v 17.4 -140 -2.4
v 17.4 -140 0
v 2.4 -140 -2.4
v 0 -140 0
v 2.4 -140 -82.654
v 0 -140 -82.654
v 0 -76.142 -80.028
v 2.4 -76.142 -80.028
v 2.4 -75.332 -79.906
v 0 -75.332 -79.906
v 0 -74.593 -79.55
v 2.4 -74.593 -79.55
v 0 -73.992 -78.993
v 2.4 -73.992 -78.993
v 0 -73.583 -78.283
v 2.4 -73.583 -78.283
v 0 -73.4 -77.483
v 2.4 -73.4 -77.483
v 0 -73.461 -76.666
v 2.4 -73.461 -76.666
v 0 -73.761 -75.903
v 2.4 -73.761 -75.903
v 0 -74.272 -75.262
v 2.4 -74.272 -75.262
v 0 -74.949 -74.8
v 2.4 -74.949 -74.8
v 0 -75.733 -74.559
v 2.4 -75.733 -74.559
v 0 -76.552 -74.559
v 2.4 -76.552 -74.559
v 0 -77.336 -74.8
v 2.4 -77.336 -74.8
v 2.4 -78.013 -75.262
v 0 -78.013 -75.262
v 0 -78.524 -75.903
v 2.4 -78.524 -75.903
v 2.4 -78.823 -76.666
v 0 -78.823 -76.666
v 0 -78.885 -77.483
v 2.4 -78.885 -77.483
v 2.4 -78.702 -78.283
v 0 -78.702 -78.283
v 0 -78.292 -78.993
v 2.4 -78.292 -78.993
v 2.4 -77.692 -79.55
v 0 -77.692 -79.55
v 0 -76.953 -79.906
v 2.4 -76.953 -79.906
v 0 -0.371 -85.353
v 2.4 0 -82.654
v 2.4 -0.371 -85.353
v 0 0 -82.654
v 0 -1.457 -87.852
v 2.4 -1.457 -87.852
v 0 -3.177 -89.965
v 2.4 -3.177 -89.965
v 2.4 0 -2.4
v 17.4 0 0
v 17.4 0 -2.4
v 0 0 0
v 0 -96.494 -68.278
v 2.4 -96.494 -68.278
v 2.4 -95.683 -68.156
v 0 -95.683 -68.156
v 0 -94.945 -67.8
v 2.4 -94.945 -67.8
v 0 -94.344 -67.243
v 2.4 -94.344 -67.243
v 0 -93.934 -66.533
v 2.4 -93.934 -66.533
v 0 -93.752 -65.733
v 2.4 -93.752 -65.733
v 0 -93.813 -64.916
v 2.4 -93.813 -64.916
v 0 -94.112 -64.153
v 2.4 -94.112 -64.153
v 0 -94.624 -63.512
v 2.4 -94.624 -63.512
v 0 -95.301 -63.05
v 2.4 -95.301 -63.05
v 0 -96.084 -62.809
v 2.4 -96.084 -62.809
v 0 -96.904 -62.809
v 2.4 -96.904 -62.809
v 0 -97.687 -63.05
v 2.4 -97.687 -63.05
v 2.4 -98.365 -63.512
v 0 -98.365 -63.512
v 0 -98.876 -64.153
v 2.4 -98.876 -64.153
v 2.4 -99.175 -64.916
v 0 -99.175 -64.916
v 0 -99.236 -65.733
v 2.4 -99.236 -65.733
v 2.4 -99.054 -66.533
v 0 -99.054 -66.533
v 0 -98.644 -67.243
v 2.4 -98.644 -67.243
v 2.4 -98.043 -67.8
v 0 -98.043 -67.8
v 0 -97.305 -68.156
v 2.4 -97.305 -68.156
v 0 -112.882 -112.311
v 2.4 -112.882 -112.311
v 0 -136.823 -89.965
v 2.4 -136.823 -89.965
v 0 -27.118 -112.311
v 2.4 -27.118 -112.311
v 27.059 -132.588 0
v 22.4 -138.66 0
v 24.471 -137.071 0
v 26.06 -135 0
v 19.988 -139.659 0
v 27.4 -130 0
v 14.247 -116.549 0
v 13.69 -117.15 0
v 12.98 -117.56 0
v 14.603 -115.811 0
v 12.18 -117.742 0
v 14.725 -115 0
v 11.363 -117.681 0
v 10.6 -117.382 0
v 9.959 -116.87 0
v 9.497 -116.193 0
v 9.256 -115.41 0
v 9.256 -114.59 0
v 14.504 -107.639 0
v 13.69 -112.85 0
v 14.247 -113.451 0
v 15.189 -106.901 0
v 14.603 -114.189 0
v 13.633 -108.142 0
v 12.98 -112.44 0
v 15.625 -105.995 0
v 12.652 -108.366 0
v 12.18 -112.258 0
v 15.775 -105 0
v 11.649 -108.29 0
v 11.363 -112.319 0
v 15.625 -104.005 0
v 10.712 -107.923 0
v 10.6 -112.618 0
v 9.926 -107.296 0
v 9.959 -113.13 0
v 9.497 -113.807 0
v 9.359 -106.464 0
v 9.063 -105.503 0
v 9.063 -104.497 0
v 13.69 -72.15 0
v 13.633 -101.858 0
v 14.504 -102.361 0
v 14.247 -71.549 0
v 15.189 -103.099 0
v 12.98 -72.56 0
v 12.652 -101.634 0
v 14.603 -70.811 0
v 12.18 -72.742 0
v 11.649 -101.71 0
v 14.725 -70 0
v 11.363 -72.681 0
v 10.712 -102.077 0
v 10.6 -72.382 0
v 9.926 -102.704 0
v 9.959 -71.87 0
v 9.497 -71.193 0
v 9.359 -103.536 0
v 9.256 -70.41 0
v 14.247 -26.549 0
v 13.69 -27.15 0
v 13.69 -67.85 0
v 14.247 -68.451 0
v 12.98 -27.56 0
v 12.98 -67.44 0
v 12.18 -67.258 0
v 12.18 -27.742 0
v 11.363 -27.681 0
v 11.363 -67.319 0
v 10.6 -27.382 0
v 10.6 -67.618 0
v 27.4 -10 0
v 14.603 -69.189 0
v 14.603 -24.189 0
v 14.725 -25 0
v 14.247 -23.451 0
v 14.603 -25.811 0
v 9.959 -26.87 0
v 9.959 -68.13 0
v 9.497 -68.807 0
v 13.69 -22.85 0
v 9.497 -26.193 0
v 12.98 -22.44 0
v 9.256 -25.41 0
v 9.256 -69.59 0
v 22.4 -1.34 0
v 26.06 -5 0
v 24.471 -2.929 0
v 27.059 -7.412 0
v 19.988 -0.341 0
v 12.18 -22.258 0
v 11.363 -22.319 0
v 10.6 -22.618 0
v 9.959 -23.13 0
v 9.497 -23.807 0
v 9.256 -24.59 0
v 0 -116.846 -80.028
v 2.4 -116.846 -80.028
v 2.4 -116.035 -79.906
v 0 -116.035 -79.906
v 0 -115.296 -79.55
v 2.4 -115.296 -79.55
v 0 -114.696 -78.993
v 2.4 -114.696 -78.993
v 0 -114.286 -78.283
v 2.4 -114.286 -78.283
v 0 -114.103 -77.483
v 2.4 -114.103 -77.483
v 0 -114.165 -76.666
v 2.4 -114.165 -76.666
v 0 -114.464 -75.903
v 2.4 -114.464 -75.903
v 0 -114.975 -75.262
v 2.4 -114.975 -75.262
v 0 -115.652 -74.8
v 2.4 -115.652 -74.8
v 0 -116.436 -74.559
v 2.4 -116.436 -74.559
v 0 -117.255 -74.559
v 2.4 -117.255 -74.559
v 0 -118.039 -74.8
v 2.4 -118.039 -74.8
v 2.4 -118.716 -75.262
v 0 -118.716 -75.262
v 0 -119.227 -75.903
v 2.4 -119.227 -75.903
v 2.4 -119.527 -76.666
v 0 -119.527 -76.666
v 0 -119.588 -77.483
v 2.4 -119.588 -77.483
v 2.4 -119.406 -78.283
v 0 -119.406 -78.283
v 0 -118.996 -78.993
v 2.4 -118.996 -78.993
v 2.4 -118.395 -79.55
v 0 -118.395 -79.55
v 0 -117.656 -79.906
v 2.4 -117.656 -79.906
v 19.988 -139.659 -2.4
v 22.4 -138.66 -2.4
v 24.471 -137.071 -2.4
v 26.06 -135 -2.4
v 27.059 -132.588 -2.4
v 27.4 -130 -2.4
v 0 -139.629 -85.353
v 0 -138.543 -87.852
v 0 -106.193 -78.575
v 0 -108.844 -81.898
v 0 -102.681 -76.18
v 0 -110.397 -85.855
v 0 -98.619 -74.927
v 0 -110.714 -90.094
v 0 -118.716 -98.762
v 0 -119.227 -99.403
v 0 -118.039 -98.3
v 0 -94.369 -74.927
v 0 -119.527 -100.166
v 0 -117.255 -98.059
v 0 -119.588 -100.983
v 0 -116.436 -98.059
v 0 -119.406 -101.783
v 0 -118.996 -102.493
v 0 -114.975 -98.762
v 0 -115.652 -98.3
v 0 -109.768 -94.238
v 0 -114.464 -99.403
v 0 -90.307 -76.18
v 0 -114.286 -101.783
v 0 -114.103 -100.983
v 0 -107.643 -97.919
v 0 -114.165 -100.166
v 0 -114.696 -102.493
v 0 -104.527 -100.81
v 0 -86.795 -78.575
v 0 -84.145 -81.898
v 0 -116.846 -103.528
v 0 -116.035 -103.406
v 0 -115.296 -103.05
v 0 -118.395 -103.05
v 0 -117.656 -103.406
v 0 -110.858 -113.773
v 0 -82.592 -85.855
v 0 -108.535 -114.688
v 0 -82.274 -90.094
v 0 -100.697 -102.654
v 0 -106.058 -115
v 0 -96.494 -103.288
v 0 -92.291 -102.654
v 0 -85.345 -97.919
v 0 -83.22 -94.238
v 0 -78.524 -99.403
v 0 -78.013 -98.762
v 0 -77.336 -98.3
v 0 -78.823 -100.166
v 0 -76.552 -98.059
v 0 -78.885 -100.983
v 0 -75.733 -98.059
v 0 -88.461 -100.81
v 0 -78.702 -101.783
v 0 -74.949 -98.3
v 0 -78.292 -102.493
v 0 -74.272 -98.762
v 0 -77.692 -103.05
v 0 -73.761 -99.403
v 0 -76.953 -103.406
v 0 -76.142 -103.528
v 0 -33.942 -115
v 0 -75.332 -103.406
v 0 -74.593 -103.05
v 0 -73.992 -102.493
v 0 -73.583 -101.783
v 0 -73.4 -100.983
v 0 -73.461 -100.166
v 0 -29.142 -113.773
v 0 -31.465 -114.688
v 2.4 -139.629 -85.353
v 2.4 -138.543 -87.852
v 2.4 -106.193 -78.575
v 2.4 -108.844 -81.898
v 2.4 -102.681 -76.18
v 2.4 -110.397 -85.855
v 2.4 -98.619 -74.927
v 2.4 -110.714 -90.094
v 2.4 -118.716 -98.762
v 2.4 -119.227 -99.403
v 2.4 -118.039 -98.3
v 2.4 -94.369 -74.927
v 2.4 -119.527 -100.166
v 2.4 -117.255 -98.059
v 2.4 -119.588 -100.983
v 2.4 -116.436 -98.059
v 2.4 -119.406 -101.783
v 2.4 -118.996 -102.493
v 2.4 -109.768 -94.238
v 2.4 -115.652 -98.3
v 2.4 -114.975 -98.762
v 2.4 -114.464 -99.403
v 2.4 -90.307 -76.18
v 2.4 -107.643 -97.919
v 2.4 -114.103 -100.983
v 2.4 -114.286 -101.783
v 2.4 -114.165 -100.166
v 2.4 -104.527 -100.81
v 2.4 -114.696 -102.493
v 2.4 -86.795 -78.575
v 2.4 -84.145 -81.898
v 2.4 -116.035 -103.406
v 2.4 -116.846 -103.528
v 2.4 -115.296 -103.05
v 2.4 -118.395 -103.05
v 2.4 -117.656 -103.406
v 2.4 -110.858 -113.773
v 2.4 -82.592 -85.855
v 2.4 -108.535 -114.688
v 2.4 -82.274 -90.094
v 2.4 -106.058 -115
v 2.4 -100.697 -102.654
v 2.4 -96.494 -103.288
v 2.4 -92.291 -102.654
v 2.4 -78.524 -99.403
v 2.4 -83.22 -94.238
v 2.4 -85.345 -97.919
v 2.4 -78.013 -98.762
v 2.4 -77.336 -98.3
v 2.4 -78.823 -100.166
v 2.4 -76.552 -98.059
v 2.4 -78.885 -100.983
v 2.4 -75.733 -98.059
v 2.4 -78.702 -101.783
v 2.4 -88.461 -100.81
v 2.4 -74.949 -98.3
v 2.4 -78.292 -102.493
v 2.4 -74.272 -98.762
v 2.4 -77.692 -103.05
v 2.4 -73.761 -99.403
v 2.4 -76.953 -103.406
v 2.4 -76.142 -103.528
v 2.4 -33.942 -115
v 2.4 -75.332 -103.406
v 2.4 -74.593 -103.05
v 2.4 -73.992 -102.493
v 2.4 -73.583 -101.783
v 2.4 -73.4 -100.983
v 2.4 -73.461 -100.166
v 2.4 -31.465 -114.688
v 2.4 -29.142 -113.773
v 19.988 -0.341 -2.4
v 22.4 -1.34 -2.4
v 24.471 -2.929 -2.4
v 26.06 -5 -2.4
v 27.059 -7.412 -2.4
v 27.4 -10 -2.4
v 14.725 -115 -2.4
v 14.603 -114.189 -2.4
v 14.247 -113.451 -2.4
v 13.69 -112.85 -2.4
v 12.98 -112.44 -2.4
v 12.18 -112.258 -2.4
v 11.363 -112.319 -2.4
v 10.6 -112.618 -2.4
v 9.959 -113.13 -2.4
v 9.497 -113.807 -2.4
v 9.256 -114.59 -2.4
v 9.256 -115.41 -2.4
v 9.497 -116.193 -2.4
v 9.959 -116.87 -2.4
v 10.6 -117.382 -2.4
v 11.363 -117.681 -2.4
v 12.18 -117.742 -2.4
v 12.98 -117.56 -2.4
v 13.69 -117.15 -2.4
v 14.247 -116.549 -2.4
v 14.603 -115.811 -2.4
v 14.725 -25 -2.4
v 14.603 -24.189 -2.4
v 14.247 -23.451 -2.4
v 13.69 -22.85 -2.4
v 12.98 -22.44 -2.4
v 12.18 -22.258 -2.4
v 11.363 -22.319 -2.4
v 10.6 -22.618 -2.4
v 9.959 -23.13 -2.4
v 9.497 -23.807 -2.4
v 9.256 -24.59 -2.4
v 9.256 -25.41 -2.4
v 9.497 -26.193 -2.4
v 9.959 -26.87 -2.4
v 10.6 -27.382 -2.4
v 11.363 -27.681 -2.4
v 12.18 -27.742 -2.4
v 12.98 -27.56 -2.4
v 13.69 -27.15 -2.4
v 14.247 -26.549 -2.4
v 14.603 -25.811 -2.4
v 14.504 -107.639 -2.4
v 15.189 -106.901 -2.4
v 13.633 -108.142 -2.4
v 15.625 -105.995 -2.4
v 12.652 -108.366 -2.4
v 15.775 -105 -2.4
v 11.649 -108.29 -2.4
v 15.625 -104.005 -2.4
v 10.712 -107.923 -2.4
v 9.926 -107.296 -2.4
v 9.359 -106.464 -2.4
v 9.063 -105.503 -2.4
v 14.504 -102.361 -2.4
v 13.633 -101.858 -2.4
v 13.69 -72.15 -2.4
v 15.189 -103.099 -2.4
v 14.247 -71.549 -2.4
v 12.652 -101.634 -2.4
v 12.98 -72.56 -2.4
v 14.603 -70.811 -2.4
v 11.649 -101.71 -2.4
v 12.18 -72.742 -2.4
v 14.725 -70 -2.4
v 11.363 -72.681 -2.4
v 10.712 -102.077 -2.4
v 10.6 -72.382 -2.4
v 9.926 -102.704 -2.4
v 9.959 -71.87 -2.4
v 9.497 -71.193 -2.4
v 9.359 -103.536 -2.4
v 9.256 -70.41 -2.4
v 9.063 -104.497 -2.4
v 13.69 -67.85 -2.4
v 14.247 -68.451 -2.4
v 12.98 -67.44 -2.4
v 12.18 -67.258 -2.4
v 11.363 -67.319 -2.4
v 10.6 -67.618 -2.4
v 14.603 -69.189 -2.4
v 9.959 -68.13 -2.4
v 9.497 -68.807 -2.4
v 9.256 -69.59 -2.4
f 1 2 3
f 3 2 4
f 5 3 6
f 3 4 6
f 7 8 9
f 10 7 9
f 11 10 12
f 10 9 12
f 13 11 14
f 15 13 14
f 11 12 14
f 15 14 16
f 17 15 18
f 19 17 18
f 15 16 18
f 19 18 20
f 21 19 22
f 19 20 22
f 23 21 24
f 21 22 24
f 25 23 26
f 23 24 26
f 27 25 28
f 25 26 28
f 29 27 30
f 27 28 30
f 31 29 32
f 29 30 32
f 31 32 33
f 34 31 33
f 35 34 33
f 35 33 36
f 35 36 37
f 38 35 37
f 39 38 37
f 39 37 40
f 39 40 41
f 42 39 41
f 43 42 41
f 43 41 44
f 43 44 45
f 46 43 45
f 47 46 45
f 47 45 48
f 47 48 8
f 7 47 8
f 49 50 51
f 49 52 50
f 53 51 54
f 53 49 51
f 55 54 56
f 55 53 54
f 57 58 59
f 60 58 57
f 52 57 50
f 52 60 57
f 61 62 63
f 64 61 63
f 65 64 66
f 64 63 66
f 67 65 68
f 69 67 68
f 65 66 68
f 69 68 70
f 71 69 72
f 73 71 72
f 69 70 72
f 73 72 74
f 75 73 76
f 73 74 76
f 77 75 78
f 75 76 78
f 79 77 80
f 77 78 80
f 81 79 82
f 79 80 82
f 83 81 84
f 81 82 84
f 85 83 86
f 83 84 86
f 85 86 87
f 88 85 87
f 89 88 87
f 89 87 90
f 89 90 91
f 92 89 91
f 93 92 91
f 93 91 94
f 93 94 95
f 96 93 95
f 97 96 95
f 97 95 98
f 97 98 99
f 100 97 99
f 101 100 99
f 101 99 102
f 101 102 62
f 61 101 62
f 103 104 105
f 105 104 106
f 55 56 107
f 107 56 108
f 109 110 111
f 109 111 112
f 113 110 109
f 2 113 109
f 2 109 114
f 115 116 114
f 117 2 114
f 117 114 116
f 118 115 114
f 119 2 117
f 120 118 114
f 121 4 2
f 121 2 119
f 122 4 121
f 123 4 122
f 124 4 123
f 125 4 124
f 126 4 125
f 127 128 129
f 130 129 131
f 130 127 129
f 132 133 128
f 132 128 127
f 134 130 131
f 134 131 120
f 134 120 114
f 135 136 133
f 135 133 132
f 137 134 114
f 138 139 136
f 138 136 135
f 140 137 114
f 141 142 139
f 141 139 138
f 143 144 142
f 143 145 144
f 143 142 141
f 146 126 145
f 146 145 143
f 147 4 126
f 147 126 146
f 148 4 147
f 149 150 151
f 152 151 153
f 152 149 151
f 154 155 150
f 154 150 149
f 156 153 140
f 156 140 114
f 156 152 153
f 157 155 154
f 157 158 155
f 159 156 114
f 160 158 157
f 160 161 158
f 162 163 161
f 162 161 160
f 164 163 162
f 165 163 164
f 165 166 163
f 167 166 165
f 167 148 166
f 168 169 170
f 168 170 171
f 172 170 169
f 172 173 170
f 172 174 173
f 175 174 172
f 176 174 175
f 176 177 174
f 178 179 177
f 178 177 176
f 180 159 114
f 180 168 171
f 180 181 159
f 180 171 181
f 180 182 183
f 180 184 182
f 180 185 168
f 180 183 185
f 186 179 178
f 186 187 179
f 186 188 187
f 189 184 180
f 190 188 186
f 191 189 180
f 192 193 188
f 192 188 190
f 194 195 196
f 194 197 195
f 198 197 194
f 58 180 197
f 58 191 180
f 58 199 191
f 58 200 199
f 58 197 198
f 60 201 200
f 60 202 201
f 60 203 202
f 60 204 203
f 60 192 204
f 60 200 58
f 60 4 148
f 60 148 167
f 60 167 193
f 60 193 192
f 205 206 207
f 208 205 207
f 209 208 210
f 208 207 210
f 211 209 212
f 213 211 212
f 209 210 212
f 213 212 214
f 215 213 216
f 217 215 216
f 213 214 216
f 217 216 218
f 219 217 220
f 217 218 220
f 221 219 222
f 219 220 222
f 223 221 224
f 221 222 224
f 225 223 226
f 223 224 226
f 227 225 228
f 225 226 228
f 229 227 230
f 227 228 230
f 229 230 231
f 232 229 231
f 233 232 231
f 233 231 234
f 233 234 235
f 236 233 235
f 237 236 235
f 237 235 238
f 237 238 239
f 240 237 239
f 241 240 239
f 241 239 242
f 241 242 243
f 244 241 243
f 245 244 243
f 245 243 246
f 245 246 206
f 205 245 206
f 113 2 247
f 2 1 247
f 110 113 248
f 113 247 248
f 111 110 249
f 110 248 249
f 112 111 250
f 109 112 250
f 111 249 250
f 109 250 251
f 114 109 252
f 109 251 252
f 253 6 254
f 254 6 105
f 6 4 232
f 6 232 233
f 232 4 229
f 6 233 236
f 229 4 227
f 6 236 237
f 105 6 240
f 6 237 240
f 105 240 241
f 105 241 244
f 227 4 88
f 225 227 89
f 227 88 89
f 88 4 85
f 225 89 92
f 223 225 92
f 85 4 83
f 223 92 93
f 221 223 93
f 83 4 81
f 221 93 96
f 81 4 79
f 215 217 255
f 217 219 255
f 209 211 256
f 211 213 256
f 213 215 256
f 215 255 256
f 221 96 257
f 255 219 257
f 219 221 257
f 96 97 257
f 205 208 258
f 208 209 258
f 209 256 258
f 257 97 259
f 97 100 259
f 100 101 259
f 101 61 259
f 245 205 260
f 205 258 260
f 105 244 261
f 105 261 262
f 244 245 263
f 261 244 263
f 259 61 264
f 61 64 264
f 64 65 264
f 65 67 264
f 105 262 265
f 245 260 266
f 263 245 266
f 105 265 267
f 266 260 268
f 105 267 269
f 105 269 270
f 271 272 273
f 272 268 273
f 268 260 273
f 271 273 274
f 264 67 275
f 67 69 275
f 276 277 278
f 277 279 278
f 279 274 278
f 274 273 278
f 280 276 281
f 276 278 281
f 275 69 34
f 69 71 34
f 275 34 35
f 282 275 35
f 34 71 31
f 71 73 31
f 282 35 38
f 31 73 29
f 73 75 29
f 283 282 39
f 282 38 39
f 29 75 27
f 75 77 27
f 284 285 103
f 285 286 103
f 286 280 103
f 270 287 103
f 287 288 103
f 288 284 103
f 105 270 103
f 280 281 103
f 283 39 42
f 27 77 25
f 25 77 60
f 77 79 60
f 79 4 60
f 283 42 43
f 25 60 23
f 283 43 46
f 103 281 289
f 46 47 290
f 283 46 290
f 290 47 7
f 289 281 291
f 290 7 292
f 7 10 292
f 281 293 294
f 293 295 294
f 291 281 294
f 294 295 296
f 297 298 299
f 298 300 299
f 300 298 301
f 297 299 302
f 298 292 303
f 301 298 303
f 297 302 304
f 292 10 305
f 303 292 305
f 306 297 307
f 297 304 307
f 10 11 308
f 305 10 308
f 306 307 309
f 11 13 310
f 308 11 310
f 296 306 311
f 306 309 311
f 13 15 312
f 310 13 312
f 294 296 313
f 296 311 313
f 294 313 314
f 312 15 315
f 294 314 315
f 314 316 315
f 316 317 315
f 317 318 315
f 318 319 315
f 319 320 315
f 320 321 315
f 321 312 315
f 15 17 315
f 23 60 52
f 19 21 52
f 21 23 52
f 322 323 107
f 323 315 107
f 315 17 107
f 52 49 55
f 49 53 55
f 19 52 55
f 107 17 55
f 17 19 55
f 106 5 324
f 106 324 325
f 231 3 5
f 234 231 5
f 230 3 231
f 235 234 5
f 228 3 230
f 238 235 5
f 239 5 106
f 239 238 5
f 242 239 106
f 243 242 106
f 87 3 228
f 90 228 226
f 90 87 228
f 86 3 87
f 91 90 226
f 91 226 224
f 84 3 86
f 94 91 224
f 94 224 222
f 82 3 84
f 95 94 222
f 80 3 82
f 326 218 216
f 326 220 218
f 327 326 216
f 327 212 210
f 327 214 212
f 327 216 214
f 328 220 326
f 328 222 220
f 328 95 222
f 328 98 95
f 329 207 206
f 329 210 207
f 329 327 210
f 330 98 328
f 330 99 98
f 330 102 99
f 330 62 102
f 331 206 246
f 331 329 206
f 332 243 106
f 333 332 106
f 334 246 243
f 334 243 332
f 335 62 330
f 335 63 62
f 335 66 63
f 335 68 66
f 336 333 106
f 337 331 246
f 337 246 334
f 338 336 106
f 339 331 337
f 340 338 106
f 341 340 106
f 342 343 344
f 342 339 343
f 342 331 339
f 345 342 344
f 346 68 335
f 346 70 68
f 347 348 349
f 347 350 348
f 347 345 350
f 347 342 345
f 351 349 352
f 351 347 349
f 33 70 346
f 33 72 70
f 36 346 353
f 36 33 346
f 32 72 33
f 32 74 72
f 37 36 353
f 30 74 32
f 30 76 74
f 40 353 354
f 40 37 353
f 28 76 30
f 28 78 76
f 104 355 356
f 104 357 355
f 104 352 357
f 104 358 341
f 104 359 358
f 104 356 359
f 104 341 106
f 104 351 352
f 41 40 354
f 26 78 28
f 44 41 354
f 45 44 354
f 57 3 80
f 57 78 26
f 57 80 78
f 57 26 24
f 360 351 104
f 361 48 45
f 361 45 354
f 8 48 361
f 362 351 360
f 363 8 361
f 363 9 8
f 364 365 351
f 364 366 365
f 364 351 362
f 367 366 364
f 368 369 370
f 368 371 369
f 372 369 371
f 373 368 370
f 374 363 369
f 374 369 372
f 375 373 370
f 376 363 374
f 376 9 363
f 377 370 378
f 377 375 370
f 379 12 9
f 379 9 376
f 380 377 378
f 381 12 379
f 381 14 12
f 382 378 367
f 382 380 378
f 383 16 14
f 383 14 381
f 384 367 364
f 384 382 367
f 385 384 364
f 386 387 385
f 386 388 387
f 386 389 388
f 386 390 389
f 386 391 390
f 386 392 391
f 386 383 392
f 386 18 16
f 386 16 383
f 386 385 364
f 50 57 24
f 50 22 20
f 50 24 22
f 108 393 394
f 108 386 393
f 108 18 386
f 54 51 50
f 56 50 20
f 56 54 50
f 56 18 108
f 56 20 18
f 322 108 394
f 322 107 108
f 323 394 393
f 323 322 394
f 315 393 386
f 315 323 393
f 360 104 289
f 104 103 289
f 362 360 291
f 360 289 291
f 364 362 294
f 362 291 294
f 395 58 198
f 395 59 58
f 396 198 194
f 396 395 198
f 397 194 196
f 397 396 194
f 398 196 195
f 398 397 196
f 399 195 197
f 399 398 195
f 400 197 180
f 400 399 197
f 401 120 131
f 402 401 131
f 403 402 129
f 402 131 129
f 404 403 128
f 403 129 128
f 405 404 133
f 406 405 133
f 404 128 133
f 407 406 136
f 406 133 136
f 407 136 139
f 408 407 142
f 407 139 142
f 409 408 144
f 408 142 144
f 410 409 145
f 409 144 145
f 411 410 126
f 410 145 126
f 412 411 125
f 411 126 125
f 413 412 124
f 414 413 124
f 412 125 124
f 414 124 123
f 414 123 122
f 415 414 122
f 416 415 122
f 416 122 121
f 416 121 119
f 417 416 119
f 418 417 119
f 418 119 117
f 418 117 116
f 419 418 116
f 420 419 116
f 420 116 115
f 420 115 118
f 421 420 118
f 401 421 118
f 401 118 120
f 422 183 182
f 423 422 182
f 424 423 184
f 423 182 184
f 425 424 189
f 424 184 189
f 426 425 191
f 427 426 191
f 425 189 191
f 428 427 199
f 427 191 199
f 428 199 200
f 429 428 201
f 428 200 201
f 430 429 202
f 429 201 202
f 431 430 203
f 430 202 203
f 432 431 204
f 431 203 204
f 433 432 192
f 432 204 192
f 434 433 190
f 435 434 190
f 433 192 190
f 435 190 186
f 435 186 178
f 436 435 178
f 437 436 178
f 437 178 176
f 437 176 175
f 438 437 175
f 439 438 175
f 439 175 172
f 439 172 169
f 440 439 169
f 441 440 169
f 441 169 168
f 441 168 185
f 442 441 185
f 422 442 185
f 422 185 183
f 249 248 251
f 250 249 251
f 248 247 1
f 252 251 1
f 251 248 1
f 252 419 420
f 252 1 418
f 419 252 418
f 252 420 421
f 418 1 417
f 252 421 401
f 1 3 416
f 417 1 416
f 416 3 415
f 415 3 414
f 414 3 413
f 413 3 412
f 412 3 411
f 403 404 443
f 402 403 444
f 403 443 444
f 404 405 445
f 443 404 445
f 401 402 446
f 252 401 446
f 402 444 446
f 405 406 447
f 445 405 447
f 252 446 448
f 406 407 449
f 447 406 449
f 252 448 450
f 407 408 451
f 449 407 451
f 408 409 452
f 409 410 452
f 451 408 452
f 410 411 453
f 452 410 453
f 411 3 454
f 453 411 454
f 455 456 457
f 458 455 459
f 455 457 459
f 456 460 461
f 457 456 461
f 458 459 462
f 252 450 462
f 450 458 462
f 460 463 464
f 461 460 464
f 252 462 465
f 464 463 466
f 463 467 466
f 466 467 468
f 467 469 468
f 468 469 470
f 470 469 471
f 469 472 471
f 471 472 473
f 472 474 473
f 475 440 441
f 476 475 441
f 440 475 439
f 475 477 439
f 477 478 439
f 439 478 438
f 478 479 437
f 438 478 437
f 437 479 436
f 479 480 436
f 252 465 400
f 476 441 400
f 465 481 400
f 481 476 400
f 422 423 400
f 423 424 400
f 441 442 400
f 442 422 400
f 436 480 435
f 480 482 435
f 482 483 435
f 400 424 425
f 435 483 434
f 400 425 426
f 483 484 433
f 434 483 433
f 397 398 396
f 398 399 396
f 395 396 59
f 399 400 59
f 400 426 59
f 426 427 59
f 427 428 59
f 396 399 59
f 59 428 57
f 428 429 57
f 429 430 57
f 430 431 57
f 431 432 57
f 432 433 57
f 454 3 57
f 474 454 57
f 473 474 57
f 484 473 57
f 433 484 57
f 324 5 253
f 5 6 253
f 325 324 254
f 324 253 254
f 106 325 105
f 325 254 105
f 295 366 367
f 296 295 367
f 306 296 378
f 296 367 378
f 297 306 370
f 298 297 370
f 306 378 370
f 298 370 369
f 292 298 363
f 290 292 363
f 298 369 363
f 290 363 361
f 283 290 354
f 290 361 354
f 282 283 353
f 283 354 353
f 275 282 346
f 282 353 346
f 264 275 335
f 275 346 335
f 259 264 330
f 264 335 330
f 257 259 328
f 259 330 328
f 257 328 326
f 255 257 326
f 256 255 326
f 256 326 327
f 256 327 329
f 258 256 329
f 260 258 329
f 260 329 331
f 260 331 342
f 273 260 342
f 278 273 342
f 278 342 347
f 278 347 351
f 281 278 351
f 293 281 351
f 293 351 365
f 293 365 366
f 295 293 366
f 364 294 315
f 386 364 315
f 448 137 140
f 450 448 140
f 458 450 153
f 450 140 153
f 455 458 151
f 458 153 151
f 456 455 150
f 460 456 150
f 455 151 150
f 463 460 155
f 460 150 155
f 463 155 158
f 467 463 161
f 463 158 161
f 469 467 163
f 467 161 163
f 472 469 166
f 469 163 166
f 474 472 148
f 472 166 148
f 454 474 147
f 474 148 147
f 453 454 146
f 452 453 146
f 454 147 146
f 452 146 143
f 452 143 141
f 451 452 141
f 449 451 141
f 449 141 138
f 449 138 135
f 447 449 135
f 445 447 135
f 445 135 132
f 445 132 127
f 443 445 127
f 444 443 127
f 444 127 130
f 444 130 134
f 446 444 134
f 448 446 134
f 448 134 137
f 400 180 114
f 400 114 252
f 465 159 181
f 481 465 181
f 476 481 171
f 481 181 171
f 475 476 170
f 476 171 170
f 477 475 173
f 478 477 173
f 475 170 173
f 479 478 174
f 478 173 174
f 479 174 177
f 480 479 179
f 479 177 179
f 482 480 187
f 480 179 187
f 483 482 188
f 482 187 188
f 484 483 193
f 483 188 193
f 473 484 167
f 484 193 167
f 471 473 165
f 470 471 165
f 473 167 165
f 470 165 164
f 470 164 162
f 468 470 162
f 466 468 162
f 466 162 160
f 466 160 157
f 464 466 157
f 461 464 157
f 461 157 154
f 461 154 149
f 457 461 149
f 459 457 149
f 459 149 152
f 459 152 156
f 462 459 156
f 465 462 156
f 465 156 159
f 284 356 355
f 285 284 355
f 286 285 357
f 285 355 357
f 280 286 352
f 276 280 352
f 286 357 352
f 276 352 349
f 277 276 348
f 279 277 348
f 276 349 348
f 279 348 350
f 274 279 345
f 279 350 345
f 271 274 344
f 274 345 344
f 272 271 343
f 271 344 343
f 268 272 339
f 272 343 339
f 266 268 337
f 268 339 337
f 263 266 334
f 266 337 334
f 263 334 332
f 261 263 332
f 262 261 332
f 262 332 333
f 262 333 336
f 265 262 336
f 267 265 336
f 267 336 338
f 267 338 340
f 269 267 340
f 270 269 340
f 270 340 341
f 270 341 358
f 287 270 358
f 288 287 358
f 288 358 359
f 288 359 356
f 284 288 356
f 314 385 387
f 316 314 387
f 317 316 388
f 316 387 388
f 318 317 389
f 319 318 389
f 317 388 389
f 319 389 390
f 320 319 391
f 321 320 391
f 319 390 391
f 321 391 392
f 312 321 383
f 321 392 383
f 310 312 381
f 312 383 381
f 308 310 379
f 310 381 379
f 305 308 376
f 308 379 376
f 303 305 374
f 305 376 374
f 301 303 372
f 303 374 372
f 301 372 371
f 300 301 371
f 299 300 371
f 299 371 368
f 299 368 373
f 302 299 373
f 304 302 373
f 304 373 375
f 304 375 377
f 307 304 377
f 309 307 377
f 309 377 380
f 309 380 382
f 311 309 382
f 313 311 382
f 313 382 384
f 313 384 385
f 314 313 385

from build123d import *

# Parameters (mm, degrees)
SKETCH1_W           = 115
SKETCH1_H           = 140
BOSS_EXTRUDE1_DEPTH = 2.4
CUT_EXTRUDE1_DEPTH  = 3.4
FILLET1_R           = 10
SKETCH3_W           = 2.4
SKETCH3_H           = 140
BOSS_EXTRUDE2_DEPTH = 25
FILLET2_R           = 10
SKETCH4_R           = 2.75
CUT_EXTRUDE2_DEPTH  = 116
SKETCH5_R           = 14.26
SKETCH5_R_2         = 2.75
CUT_EXTRUDE3_DEPTH  = 3.4
SKETCH6_R           = 3.375
CUT_EXTRUDE4_DEPTH  = 116


with BuildPart() as part:
    # Sketch1 → Boss-Extrude1 (new body)
    with BuildSketch(Plane(origin=(0, 0, 0), x_dir=(0, 0, -1), z_dir=(1, 0, 0))):
        with Locations((57.5, -70)):
            Rectangle(SKETCH1_W, SKETCH1_H)
    extrude(amount=BOSS_EXTRUDE1_DEPTH)

    # Sketch2 → Cut-Extrude1 (cut, through all)
    with BuildSketch(Plane(origin=(2.4, 0, 0), x_dir=(0, 0, -1), z_dir=(1, 0, 0))):
        Polygon((87, 0), (115, -30), (142.616199658, -32.505405645), (142.616199658, 14.875556406), align=None)
        Polygon((115, -110), (87, -140), (87, -152.661109726), (136.310004643, -152.661109726), align=None)
    extrude(amount=-CUT_EXTRUDE1_DEPTH, mode=Mode.SUBTRACT)

    # Fillet1
    fillet1_edges = [part.edges().sort_by_distance(p)[0] for p in [
        (1.2, 0, -87),
        (1.2, -30, -115),
        (1.2, -110, -115),
        (1.2, -140, -87),
    ]]
    fillet(fillet1_edges, radius=FILLET1_R)

    # Sketch3 → Boss-Extrude2 (add)
    with BuildSketch(Plane(origin=(2.4, 0, 0), x_dir=(0, 0, -1), z_dir=(1, 0, 0))):
        with Locations((1.2, -70)):
            Rectangle(SKETCH3_W, SKETCH3_H)
    extrude(amount=BOSS_EXTRUDE2_DEPTH)

    # Fillet2
    fillet2_edges = [part.edges().sort_by_distance(p)[0] for p in [
        (27.4, -140, -1.2),
        (27.4, 0, -1.2),
    ]]
    fillet(fillet2_edges, radius=FILLET2_R)

    # Sketch4 → Cut-Extrude2 (cut, through all)
    with BuildSketch(Plane.XY):
        with Locations((11.974983581, -70)):
            Circle(SKETCH4_R)
        with Locations((11.974983581, -25)):
            Circle(SKETCH4_R)
        with Locations((11.974983581, -115)):
            Circle(SKETCH4_R)
    extrude(amount=-CUT_EXTRUDE2_DEPTH, mode=Mode.SUBTRACT)

    # Sketch5 → Cut-Extrude3 (cut, through all)
    with BuildSketch(Plane(origin=(2.4, 0, 0), x_dir=(0, 0, -1), z_dir=(1, 0, 0))):
        with Locations((89.027947804, -96.494029199)):
            Circle(SKETCH5_R)
        with Locations((77.277947804, -76.14243221)):
            Circle(SKETCH5_R_2)
        with Locations((100.777947804, -76.14243221)):
            Circle(SKETCH5_R_2)
        with Locations((100.777947804, -116.845626188)):
            Circle(SKETCH5_R_2)
        with Locations((77.277947804, -116.845626188)):
            Circle(SKETCH5_R_2)
        with Locations((65.527947804, -96.494029199)):
            Circle(SKETCH5_R_2)
    extrude(amount=-CUT_EXTRUDE3_DEPTH, mode=Mode.SUBTRACT)

    # Sketch6 → Cut-Extrude4 (cut, through all)
    with BuildSketch(Plane.XY):
        with Locations((12.4, -105)):
            Circle(SKETCH6_R)
    extrude(amount=-CUT_EXTRUDE4_DEPTH, mode=Mode.SUBTRACT)


solid = part.part
